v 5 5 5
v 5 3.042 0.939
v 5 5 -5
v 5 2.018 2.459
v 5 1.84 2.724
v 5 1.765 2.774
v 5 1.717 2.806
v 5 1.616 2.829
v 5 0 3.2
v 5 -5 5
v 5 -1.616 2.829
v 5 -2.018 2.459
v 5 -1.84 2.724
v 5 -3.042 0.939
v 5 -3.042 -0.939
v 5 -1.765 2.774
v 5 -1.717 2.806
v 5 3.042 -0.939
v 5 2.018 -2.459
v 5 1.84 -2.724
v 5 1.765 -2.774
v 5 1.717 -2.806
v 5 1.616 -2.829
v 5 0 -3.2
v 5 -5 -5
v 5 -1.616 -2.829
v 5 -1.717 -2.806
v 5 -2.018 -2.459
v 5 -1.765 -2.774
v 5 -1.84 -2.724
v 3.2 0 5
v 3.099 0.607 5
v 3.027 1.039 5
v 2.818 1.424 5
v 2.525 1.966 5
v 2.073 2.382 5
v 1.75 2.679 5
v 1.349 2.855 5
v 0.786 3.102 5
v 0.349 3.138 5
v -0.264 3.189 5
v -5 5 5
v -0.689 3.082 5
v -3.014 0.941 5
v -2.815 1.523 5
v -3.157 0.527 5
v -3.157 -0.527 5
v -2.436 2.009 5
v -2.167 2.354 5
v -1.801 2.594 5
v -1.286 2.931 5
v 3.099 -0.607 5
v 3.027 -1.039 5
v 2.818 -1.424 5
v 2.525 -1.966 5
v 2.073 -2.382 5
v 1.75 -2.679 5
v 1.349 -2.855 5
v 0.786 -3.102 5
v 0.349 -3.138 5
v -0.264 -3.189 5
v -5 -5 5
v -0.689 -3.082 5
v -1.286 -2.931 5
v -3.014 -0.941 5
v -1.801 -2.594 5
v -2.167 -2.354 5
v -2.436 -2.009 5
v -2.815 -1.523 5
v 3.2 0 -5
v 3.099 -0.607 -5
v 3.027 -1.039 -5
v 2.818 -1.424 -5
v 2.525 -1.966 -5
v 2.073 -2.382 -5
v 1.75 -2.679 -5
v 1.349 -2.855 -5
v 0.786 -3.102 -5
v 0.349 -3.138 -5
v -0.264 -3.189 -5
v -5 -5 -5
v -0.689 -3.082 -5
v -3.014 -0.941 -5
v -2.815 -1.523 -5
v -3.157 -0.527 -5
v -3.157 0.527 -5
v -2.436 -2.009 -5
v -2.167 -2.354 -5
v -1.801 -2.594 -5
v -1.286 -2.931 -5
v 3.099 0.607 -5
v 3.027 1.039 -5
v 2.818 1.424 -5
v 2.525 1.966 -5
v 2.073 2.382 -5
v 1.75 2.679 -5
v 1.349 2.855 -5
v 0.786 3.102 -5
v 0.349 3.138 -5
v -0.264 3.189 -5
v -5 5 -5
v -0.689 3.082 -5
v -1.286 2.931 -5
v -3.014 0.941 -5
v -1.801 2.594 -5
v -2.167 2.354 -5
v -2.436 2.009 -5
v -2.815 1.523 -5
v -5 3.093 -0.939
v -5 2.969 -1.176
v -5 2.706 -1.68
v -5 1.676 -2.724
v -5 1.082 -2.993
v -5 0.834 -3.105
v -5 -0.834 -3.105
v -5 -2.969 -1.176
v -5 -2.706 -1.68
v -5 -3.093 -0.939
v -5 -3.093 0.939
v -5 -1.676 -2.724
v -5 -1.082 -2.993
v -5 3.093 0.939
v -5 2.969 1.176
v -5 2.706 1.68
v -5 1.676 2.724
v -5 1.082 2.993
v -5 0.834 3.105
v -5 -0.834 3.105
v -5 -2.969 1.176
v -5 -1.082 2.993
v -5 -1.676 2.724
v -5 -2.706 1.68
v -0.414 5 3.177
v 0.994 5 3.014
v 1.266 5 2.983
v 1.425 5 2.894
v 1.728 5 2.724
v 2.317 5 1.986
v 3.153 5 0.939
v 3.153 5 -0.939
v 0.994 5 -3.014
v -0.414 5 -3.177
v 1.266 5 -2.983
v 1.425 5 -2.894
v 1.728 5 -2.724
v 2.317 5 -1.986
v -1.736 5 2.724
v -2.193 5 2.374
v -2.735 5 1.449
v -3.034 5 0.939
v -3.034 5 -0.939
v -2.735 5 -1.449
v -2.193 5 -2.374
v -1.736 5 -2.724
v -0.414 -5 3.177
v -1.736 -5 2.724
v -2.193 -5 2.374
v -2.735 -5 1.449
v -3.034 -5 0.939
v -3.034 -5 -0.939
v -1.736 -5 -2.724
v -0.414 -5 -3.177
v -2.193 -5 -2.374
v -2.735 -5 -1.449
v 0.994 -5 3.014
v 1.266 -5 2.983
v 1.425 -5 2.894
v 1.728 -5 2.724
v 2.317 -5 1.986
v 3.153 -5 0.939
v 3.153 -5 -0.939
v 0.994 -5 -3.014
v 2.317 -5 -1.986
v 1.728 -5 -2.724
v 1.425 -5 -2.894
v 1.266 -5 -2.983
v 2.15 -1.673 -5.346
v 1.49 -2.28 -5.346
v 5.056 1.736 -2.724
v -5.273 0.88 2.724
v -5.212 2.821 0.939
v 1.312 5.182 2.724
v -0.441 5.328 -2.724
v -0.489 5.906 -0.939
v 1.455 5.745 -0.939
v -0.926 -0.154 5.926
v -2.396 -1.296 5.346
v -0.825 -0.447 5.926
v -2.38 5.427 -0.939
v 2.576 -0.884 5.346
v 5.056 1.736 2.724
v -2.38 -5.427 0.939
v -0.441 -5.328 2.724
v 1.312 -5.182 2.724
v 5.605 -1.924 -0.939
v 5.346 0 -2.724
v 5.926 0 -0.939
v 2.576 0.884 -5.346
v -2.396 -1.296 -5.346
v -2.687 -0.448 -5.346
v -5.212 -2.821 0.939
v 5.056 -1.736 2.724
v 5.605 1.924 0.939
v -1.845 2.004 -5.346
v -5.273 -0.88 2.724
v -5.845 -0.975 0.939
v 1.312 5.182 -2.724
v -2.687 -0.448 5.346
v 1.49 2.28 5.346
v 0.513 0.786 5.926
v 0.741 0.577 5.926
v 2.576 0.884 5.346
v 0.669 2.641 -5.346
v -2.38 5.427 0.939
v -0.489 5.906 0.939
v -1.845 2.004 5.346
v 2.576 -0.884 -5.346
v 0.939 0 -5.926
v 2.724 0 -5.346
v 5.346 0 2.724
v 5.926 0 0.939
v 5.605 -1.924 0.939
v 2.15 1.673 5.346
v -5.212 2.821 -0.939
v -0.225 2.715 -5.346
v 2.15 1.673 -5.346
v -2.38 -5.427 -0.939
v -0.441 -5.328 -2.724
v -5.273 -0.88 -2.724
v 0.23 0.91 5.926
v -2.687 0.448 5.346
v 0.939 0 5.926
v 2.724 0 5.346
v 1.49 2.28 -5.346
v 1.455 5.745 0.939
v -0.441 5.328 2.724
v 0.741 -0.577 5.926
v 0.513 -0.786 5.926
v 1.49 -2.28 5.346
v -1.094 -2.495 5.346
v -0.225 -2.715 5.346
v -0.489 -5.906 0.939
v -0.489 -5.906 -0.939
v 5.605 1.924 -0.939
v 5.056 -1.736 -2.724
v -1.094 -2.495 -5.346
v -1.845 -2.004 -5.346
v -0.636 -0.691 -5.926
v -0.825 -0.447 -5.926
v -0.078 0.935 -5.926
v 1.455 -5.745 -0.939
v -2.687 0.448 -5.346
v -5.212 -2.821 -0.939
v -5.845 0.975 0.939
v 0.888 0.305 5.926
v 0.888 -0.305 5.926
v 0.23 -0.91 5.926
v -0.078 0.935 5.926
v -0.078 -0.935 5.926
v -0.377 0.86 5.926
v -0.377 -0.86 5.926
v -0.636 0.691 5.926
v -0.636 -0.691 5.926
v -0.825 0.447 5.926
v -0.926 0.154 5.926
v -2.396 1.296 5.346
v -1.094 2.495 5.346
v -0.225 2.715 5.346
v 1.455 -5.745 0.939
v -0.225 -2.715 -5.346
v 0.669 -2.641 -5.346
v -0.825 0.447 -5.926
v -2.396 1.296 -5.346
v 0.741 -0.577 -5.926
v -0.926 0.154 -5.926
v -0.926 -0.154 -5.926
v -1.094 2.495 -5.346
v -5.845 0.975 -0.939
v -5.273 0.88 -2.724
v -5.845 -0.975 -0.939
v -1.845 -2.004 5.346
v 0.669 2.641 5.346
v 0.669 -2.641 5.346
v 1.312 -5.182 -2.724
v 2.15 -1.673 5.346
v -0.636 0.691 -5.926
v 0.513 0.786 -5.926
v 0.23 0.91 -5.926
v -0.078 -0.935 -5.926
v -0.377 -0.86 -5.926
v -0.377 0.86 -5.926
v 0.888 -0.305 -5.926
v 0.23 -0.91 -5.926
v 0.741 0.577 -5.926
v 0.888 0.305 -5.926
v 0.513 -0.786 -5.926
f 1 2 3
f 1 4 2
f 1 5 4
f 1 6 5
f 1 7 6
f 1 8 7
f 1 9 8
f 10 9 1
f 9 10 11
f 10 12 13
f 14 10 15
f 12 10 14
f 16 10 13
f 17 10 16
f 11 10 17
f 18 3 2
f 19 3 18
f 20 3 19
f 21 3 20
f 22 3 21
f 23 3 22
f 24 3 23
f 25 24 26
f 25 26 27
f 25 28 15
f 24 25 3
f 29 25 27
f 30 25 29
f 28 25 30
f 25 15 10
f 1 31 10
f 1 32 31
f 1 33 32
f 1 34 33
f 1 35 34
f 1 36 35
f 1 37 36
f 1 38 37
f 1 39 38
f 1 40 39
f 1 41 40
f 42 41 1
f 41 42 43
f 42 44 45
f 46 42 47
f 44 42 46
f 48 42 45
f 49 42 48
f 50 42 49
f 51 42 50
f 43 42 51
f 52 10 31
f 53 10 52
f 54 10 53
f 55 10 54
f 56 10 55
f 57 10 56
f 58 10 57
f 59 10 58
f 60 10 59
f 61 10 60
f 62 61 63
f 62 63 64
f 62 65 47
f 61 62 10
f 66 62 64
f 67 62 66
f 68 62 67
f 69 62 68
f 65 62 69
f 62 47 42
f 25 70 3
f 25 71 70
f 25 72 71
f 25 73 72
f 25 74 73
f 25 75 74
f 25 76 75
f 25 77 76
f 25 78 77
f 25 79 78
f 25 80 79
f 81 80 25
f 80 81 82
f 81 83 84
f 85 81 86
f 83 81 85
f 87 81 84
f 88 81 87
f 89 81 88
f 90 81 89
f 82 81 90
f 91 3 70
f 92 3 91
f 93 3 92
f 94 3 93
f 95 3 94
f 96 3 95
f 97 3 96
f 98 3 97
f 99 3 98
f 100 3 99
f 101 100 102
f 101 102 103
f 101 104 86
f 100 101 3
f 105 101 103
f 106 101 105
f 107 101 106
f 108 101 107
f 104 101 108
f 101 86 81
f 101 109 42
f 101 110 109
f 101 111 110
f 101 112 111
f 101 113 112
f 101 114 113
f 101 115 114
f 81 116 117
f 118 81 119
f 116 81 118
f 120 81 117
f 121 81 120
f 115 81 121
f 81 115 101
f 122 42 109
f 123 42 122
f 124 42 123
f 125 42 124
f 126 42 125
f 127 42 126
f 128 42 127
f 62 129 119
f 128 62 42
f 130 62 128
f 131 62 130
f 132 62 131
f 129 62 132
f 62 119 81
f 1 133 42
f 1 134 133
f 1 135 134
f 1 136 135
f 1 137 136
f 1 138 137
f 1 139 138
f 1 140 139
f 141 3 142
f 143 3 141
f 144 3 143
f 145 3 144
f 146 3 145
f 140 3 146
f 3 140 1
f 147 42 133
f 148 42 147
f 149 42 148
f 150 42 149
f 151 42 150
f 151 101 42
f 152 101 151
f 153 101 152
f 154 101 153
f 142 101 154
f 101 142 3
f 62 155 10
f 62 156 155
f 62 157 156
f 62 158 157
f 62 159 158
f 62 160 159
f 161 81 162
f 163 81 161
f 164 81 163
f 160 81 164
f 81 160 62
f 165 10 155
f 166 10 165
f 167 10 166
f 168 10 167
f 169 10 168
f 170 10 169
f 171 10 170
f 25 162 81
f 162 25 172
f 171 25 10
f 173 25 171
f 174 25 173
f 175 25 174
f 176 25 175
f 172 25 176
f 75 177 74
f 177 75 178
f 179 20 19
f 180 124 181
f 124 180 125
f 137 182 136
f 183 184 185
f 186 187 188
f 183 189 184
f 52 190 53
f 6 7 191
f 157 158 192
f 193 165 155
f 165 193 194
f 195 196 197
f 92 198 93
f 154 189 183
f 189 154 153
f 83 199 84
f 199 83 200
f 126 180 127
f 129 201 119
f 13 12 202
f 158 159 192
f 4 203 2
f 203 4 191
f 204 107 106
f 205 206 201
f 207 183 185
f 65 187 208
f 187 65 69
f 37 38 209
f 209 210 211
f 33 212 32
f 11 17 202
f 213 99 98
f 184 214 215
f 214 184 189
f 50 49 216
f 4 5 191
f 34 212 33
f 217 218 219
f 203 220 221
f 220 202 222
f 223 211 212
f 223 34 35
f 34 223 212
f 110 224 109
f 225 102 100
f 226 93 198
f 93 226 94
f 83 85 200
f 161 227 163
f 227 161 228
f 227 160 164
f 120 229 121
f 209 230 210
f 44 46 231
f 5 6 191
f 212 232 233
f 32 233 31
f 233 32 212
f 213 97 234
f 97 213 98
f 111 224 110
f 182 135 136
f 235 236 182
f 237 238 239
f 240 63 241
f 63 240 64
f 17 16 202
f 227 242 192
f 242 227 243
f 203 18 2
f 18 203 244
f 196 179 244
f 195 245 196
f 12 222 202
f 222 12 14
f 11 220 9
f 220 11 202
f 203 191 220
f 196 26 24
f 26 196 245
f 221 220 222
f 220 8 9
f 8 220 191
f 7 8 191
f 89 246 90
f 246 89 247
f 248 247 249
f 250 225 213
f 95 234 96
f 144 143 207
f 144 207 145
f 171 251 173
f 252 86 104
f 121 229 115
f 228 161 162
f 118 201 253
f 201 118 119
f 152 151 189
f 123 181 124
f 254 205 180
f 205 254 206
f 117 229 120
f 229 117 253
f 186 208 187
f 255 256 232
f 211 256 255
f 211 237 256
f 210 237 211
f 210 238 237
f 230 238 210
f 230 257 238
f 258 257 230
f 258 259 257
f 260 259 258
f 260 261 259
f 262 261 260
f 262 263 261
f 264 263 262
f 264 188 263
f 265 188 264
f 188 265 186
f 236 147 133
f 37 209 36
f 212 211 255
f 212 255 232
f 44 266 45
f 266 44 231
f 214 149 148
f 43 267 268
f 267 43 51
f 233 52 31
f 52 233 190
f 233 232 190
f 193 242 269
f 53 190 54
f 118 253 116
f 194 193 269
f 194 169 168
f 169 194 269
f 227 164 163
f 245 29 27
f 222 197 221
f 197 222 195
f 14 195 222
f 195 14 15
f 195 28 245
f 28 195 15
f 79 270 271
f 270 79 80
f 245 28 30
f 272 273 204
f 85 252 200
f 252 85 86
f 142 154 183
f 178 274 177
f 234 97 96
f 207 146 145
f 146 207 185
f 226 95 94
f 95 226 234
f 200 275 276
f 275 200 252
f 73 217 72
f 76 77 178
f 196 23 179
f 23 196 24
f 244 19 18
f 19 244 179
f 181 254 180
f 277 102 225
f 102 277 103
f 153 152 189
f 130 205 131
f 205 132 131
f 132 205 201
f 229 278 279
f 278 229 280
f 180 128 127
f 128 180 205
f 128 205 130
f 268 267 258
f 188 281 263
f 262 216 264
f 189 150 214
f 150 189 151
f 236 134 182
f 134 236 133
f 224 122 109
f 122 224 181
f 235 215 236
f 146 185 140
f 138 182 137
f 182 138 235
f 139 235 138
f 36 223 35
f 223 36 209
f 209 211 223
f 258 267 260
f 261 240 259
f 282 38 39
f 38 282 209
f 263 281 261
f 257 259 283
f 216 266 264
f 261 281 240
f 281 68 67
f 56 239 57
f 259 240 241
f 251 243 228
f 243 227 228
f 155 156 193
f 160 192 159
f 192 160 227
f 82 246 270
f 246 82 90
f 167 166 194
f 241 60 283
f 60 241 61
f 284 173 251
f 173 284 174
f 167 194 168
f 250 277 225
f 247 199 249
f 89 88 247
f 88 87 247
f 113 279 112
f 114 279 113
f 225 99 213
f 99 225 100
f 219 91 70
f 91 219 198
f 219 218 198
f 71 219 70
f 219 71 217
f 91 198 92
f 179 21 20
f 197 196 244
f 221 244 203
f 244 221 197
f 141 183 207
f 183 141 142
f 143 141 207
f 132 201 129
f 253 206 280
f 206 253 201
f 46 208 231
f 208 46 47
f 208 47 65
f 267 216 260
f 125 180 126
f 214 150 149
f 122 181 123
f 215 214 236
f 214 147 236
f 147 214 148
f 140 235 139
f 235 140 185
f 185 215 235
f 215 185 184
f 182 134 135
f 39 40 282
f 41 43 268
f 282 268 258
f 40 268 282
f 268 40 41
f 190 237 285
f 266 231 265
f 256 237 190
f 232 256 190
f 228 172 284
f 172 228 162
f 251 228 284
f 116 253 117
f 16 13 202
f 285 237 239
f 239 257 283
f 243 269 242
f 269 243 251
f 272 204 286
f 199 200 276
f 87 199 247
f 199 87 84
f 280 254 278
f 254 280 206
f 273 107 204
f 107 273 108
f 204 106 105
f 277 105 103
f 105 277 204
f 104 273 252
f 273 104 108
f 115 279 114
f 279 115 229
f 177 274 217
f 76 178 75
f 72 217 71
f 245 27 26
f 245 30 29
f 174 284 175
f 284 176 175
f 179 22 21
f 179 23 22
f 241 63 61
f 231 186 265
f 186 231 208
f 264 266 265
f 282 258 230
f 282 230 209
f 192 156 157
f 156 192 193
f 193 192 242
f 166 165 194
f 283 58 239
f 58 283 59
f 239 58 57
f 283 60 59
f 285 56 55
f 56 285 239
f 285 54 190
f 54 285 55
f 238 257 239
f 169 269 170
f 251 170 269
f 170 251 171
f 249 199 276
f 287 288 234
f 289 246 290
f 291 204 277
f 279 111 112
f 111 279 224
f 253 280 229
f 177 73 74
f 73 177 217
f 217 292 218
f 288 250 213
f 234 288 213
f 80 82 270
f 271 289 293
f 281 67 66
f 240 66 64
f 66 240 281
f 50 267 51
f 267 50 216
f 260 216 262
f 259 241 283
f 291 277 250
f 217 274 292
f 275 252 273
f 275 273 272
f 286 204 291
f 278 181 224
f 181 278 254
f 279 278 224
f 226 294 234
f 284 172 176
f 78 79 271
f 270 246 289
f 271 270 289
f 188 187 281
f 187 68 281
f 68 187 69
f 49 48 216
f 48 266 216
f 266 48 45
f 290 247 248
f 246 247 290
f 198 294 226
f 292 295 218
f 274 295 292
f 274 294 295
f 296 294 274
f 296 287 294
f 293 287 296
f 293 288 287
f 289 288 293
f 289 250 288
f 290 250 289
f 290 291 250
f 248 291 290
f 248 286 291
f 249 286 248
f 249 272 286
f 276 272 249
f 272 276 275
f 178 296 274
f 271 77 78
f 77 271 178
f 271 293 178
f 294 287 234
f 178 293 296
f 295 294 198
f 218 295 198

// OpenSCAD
// Generated using react-scad (https://github.com/leonmeka/react-scad)

union() {
  cube(size = [10, 10, 10], center = true);
  sphere(r = 6);
}
